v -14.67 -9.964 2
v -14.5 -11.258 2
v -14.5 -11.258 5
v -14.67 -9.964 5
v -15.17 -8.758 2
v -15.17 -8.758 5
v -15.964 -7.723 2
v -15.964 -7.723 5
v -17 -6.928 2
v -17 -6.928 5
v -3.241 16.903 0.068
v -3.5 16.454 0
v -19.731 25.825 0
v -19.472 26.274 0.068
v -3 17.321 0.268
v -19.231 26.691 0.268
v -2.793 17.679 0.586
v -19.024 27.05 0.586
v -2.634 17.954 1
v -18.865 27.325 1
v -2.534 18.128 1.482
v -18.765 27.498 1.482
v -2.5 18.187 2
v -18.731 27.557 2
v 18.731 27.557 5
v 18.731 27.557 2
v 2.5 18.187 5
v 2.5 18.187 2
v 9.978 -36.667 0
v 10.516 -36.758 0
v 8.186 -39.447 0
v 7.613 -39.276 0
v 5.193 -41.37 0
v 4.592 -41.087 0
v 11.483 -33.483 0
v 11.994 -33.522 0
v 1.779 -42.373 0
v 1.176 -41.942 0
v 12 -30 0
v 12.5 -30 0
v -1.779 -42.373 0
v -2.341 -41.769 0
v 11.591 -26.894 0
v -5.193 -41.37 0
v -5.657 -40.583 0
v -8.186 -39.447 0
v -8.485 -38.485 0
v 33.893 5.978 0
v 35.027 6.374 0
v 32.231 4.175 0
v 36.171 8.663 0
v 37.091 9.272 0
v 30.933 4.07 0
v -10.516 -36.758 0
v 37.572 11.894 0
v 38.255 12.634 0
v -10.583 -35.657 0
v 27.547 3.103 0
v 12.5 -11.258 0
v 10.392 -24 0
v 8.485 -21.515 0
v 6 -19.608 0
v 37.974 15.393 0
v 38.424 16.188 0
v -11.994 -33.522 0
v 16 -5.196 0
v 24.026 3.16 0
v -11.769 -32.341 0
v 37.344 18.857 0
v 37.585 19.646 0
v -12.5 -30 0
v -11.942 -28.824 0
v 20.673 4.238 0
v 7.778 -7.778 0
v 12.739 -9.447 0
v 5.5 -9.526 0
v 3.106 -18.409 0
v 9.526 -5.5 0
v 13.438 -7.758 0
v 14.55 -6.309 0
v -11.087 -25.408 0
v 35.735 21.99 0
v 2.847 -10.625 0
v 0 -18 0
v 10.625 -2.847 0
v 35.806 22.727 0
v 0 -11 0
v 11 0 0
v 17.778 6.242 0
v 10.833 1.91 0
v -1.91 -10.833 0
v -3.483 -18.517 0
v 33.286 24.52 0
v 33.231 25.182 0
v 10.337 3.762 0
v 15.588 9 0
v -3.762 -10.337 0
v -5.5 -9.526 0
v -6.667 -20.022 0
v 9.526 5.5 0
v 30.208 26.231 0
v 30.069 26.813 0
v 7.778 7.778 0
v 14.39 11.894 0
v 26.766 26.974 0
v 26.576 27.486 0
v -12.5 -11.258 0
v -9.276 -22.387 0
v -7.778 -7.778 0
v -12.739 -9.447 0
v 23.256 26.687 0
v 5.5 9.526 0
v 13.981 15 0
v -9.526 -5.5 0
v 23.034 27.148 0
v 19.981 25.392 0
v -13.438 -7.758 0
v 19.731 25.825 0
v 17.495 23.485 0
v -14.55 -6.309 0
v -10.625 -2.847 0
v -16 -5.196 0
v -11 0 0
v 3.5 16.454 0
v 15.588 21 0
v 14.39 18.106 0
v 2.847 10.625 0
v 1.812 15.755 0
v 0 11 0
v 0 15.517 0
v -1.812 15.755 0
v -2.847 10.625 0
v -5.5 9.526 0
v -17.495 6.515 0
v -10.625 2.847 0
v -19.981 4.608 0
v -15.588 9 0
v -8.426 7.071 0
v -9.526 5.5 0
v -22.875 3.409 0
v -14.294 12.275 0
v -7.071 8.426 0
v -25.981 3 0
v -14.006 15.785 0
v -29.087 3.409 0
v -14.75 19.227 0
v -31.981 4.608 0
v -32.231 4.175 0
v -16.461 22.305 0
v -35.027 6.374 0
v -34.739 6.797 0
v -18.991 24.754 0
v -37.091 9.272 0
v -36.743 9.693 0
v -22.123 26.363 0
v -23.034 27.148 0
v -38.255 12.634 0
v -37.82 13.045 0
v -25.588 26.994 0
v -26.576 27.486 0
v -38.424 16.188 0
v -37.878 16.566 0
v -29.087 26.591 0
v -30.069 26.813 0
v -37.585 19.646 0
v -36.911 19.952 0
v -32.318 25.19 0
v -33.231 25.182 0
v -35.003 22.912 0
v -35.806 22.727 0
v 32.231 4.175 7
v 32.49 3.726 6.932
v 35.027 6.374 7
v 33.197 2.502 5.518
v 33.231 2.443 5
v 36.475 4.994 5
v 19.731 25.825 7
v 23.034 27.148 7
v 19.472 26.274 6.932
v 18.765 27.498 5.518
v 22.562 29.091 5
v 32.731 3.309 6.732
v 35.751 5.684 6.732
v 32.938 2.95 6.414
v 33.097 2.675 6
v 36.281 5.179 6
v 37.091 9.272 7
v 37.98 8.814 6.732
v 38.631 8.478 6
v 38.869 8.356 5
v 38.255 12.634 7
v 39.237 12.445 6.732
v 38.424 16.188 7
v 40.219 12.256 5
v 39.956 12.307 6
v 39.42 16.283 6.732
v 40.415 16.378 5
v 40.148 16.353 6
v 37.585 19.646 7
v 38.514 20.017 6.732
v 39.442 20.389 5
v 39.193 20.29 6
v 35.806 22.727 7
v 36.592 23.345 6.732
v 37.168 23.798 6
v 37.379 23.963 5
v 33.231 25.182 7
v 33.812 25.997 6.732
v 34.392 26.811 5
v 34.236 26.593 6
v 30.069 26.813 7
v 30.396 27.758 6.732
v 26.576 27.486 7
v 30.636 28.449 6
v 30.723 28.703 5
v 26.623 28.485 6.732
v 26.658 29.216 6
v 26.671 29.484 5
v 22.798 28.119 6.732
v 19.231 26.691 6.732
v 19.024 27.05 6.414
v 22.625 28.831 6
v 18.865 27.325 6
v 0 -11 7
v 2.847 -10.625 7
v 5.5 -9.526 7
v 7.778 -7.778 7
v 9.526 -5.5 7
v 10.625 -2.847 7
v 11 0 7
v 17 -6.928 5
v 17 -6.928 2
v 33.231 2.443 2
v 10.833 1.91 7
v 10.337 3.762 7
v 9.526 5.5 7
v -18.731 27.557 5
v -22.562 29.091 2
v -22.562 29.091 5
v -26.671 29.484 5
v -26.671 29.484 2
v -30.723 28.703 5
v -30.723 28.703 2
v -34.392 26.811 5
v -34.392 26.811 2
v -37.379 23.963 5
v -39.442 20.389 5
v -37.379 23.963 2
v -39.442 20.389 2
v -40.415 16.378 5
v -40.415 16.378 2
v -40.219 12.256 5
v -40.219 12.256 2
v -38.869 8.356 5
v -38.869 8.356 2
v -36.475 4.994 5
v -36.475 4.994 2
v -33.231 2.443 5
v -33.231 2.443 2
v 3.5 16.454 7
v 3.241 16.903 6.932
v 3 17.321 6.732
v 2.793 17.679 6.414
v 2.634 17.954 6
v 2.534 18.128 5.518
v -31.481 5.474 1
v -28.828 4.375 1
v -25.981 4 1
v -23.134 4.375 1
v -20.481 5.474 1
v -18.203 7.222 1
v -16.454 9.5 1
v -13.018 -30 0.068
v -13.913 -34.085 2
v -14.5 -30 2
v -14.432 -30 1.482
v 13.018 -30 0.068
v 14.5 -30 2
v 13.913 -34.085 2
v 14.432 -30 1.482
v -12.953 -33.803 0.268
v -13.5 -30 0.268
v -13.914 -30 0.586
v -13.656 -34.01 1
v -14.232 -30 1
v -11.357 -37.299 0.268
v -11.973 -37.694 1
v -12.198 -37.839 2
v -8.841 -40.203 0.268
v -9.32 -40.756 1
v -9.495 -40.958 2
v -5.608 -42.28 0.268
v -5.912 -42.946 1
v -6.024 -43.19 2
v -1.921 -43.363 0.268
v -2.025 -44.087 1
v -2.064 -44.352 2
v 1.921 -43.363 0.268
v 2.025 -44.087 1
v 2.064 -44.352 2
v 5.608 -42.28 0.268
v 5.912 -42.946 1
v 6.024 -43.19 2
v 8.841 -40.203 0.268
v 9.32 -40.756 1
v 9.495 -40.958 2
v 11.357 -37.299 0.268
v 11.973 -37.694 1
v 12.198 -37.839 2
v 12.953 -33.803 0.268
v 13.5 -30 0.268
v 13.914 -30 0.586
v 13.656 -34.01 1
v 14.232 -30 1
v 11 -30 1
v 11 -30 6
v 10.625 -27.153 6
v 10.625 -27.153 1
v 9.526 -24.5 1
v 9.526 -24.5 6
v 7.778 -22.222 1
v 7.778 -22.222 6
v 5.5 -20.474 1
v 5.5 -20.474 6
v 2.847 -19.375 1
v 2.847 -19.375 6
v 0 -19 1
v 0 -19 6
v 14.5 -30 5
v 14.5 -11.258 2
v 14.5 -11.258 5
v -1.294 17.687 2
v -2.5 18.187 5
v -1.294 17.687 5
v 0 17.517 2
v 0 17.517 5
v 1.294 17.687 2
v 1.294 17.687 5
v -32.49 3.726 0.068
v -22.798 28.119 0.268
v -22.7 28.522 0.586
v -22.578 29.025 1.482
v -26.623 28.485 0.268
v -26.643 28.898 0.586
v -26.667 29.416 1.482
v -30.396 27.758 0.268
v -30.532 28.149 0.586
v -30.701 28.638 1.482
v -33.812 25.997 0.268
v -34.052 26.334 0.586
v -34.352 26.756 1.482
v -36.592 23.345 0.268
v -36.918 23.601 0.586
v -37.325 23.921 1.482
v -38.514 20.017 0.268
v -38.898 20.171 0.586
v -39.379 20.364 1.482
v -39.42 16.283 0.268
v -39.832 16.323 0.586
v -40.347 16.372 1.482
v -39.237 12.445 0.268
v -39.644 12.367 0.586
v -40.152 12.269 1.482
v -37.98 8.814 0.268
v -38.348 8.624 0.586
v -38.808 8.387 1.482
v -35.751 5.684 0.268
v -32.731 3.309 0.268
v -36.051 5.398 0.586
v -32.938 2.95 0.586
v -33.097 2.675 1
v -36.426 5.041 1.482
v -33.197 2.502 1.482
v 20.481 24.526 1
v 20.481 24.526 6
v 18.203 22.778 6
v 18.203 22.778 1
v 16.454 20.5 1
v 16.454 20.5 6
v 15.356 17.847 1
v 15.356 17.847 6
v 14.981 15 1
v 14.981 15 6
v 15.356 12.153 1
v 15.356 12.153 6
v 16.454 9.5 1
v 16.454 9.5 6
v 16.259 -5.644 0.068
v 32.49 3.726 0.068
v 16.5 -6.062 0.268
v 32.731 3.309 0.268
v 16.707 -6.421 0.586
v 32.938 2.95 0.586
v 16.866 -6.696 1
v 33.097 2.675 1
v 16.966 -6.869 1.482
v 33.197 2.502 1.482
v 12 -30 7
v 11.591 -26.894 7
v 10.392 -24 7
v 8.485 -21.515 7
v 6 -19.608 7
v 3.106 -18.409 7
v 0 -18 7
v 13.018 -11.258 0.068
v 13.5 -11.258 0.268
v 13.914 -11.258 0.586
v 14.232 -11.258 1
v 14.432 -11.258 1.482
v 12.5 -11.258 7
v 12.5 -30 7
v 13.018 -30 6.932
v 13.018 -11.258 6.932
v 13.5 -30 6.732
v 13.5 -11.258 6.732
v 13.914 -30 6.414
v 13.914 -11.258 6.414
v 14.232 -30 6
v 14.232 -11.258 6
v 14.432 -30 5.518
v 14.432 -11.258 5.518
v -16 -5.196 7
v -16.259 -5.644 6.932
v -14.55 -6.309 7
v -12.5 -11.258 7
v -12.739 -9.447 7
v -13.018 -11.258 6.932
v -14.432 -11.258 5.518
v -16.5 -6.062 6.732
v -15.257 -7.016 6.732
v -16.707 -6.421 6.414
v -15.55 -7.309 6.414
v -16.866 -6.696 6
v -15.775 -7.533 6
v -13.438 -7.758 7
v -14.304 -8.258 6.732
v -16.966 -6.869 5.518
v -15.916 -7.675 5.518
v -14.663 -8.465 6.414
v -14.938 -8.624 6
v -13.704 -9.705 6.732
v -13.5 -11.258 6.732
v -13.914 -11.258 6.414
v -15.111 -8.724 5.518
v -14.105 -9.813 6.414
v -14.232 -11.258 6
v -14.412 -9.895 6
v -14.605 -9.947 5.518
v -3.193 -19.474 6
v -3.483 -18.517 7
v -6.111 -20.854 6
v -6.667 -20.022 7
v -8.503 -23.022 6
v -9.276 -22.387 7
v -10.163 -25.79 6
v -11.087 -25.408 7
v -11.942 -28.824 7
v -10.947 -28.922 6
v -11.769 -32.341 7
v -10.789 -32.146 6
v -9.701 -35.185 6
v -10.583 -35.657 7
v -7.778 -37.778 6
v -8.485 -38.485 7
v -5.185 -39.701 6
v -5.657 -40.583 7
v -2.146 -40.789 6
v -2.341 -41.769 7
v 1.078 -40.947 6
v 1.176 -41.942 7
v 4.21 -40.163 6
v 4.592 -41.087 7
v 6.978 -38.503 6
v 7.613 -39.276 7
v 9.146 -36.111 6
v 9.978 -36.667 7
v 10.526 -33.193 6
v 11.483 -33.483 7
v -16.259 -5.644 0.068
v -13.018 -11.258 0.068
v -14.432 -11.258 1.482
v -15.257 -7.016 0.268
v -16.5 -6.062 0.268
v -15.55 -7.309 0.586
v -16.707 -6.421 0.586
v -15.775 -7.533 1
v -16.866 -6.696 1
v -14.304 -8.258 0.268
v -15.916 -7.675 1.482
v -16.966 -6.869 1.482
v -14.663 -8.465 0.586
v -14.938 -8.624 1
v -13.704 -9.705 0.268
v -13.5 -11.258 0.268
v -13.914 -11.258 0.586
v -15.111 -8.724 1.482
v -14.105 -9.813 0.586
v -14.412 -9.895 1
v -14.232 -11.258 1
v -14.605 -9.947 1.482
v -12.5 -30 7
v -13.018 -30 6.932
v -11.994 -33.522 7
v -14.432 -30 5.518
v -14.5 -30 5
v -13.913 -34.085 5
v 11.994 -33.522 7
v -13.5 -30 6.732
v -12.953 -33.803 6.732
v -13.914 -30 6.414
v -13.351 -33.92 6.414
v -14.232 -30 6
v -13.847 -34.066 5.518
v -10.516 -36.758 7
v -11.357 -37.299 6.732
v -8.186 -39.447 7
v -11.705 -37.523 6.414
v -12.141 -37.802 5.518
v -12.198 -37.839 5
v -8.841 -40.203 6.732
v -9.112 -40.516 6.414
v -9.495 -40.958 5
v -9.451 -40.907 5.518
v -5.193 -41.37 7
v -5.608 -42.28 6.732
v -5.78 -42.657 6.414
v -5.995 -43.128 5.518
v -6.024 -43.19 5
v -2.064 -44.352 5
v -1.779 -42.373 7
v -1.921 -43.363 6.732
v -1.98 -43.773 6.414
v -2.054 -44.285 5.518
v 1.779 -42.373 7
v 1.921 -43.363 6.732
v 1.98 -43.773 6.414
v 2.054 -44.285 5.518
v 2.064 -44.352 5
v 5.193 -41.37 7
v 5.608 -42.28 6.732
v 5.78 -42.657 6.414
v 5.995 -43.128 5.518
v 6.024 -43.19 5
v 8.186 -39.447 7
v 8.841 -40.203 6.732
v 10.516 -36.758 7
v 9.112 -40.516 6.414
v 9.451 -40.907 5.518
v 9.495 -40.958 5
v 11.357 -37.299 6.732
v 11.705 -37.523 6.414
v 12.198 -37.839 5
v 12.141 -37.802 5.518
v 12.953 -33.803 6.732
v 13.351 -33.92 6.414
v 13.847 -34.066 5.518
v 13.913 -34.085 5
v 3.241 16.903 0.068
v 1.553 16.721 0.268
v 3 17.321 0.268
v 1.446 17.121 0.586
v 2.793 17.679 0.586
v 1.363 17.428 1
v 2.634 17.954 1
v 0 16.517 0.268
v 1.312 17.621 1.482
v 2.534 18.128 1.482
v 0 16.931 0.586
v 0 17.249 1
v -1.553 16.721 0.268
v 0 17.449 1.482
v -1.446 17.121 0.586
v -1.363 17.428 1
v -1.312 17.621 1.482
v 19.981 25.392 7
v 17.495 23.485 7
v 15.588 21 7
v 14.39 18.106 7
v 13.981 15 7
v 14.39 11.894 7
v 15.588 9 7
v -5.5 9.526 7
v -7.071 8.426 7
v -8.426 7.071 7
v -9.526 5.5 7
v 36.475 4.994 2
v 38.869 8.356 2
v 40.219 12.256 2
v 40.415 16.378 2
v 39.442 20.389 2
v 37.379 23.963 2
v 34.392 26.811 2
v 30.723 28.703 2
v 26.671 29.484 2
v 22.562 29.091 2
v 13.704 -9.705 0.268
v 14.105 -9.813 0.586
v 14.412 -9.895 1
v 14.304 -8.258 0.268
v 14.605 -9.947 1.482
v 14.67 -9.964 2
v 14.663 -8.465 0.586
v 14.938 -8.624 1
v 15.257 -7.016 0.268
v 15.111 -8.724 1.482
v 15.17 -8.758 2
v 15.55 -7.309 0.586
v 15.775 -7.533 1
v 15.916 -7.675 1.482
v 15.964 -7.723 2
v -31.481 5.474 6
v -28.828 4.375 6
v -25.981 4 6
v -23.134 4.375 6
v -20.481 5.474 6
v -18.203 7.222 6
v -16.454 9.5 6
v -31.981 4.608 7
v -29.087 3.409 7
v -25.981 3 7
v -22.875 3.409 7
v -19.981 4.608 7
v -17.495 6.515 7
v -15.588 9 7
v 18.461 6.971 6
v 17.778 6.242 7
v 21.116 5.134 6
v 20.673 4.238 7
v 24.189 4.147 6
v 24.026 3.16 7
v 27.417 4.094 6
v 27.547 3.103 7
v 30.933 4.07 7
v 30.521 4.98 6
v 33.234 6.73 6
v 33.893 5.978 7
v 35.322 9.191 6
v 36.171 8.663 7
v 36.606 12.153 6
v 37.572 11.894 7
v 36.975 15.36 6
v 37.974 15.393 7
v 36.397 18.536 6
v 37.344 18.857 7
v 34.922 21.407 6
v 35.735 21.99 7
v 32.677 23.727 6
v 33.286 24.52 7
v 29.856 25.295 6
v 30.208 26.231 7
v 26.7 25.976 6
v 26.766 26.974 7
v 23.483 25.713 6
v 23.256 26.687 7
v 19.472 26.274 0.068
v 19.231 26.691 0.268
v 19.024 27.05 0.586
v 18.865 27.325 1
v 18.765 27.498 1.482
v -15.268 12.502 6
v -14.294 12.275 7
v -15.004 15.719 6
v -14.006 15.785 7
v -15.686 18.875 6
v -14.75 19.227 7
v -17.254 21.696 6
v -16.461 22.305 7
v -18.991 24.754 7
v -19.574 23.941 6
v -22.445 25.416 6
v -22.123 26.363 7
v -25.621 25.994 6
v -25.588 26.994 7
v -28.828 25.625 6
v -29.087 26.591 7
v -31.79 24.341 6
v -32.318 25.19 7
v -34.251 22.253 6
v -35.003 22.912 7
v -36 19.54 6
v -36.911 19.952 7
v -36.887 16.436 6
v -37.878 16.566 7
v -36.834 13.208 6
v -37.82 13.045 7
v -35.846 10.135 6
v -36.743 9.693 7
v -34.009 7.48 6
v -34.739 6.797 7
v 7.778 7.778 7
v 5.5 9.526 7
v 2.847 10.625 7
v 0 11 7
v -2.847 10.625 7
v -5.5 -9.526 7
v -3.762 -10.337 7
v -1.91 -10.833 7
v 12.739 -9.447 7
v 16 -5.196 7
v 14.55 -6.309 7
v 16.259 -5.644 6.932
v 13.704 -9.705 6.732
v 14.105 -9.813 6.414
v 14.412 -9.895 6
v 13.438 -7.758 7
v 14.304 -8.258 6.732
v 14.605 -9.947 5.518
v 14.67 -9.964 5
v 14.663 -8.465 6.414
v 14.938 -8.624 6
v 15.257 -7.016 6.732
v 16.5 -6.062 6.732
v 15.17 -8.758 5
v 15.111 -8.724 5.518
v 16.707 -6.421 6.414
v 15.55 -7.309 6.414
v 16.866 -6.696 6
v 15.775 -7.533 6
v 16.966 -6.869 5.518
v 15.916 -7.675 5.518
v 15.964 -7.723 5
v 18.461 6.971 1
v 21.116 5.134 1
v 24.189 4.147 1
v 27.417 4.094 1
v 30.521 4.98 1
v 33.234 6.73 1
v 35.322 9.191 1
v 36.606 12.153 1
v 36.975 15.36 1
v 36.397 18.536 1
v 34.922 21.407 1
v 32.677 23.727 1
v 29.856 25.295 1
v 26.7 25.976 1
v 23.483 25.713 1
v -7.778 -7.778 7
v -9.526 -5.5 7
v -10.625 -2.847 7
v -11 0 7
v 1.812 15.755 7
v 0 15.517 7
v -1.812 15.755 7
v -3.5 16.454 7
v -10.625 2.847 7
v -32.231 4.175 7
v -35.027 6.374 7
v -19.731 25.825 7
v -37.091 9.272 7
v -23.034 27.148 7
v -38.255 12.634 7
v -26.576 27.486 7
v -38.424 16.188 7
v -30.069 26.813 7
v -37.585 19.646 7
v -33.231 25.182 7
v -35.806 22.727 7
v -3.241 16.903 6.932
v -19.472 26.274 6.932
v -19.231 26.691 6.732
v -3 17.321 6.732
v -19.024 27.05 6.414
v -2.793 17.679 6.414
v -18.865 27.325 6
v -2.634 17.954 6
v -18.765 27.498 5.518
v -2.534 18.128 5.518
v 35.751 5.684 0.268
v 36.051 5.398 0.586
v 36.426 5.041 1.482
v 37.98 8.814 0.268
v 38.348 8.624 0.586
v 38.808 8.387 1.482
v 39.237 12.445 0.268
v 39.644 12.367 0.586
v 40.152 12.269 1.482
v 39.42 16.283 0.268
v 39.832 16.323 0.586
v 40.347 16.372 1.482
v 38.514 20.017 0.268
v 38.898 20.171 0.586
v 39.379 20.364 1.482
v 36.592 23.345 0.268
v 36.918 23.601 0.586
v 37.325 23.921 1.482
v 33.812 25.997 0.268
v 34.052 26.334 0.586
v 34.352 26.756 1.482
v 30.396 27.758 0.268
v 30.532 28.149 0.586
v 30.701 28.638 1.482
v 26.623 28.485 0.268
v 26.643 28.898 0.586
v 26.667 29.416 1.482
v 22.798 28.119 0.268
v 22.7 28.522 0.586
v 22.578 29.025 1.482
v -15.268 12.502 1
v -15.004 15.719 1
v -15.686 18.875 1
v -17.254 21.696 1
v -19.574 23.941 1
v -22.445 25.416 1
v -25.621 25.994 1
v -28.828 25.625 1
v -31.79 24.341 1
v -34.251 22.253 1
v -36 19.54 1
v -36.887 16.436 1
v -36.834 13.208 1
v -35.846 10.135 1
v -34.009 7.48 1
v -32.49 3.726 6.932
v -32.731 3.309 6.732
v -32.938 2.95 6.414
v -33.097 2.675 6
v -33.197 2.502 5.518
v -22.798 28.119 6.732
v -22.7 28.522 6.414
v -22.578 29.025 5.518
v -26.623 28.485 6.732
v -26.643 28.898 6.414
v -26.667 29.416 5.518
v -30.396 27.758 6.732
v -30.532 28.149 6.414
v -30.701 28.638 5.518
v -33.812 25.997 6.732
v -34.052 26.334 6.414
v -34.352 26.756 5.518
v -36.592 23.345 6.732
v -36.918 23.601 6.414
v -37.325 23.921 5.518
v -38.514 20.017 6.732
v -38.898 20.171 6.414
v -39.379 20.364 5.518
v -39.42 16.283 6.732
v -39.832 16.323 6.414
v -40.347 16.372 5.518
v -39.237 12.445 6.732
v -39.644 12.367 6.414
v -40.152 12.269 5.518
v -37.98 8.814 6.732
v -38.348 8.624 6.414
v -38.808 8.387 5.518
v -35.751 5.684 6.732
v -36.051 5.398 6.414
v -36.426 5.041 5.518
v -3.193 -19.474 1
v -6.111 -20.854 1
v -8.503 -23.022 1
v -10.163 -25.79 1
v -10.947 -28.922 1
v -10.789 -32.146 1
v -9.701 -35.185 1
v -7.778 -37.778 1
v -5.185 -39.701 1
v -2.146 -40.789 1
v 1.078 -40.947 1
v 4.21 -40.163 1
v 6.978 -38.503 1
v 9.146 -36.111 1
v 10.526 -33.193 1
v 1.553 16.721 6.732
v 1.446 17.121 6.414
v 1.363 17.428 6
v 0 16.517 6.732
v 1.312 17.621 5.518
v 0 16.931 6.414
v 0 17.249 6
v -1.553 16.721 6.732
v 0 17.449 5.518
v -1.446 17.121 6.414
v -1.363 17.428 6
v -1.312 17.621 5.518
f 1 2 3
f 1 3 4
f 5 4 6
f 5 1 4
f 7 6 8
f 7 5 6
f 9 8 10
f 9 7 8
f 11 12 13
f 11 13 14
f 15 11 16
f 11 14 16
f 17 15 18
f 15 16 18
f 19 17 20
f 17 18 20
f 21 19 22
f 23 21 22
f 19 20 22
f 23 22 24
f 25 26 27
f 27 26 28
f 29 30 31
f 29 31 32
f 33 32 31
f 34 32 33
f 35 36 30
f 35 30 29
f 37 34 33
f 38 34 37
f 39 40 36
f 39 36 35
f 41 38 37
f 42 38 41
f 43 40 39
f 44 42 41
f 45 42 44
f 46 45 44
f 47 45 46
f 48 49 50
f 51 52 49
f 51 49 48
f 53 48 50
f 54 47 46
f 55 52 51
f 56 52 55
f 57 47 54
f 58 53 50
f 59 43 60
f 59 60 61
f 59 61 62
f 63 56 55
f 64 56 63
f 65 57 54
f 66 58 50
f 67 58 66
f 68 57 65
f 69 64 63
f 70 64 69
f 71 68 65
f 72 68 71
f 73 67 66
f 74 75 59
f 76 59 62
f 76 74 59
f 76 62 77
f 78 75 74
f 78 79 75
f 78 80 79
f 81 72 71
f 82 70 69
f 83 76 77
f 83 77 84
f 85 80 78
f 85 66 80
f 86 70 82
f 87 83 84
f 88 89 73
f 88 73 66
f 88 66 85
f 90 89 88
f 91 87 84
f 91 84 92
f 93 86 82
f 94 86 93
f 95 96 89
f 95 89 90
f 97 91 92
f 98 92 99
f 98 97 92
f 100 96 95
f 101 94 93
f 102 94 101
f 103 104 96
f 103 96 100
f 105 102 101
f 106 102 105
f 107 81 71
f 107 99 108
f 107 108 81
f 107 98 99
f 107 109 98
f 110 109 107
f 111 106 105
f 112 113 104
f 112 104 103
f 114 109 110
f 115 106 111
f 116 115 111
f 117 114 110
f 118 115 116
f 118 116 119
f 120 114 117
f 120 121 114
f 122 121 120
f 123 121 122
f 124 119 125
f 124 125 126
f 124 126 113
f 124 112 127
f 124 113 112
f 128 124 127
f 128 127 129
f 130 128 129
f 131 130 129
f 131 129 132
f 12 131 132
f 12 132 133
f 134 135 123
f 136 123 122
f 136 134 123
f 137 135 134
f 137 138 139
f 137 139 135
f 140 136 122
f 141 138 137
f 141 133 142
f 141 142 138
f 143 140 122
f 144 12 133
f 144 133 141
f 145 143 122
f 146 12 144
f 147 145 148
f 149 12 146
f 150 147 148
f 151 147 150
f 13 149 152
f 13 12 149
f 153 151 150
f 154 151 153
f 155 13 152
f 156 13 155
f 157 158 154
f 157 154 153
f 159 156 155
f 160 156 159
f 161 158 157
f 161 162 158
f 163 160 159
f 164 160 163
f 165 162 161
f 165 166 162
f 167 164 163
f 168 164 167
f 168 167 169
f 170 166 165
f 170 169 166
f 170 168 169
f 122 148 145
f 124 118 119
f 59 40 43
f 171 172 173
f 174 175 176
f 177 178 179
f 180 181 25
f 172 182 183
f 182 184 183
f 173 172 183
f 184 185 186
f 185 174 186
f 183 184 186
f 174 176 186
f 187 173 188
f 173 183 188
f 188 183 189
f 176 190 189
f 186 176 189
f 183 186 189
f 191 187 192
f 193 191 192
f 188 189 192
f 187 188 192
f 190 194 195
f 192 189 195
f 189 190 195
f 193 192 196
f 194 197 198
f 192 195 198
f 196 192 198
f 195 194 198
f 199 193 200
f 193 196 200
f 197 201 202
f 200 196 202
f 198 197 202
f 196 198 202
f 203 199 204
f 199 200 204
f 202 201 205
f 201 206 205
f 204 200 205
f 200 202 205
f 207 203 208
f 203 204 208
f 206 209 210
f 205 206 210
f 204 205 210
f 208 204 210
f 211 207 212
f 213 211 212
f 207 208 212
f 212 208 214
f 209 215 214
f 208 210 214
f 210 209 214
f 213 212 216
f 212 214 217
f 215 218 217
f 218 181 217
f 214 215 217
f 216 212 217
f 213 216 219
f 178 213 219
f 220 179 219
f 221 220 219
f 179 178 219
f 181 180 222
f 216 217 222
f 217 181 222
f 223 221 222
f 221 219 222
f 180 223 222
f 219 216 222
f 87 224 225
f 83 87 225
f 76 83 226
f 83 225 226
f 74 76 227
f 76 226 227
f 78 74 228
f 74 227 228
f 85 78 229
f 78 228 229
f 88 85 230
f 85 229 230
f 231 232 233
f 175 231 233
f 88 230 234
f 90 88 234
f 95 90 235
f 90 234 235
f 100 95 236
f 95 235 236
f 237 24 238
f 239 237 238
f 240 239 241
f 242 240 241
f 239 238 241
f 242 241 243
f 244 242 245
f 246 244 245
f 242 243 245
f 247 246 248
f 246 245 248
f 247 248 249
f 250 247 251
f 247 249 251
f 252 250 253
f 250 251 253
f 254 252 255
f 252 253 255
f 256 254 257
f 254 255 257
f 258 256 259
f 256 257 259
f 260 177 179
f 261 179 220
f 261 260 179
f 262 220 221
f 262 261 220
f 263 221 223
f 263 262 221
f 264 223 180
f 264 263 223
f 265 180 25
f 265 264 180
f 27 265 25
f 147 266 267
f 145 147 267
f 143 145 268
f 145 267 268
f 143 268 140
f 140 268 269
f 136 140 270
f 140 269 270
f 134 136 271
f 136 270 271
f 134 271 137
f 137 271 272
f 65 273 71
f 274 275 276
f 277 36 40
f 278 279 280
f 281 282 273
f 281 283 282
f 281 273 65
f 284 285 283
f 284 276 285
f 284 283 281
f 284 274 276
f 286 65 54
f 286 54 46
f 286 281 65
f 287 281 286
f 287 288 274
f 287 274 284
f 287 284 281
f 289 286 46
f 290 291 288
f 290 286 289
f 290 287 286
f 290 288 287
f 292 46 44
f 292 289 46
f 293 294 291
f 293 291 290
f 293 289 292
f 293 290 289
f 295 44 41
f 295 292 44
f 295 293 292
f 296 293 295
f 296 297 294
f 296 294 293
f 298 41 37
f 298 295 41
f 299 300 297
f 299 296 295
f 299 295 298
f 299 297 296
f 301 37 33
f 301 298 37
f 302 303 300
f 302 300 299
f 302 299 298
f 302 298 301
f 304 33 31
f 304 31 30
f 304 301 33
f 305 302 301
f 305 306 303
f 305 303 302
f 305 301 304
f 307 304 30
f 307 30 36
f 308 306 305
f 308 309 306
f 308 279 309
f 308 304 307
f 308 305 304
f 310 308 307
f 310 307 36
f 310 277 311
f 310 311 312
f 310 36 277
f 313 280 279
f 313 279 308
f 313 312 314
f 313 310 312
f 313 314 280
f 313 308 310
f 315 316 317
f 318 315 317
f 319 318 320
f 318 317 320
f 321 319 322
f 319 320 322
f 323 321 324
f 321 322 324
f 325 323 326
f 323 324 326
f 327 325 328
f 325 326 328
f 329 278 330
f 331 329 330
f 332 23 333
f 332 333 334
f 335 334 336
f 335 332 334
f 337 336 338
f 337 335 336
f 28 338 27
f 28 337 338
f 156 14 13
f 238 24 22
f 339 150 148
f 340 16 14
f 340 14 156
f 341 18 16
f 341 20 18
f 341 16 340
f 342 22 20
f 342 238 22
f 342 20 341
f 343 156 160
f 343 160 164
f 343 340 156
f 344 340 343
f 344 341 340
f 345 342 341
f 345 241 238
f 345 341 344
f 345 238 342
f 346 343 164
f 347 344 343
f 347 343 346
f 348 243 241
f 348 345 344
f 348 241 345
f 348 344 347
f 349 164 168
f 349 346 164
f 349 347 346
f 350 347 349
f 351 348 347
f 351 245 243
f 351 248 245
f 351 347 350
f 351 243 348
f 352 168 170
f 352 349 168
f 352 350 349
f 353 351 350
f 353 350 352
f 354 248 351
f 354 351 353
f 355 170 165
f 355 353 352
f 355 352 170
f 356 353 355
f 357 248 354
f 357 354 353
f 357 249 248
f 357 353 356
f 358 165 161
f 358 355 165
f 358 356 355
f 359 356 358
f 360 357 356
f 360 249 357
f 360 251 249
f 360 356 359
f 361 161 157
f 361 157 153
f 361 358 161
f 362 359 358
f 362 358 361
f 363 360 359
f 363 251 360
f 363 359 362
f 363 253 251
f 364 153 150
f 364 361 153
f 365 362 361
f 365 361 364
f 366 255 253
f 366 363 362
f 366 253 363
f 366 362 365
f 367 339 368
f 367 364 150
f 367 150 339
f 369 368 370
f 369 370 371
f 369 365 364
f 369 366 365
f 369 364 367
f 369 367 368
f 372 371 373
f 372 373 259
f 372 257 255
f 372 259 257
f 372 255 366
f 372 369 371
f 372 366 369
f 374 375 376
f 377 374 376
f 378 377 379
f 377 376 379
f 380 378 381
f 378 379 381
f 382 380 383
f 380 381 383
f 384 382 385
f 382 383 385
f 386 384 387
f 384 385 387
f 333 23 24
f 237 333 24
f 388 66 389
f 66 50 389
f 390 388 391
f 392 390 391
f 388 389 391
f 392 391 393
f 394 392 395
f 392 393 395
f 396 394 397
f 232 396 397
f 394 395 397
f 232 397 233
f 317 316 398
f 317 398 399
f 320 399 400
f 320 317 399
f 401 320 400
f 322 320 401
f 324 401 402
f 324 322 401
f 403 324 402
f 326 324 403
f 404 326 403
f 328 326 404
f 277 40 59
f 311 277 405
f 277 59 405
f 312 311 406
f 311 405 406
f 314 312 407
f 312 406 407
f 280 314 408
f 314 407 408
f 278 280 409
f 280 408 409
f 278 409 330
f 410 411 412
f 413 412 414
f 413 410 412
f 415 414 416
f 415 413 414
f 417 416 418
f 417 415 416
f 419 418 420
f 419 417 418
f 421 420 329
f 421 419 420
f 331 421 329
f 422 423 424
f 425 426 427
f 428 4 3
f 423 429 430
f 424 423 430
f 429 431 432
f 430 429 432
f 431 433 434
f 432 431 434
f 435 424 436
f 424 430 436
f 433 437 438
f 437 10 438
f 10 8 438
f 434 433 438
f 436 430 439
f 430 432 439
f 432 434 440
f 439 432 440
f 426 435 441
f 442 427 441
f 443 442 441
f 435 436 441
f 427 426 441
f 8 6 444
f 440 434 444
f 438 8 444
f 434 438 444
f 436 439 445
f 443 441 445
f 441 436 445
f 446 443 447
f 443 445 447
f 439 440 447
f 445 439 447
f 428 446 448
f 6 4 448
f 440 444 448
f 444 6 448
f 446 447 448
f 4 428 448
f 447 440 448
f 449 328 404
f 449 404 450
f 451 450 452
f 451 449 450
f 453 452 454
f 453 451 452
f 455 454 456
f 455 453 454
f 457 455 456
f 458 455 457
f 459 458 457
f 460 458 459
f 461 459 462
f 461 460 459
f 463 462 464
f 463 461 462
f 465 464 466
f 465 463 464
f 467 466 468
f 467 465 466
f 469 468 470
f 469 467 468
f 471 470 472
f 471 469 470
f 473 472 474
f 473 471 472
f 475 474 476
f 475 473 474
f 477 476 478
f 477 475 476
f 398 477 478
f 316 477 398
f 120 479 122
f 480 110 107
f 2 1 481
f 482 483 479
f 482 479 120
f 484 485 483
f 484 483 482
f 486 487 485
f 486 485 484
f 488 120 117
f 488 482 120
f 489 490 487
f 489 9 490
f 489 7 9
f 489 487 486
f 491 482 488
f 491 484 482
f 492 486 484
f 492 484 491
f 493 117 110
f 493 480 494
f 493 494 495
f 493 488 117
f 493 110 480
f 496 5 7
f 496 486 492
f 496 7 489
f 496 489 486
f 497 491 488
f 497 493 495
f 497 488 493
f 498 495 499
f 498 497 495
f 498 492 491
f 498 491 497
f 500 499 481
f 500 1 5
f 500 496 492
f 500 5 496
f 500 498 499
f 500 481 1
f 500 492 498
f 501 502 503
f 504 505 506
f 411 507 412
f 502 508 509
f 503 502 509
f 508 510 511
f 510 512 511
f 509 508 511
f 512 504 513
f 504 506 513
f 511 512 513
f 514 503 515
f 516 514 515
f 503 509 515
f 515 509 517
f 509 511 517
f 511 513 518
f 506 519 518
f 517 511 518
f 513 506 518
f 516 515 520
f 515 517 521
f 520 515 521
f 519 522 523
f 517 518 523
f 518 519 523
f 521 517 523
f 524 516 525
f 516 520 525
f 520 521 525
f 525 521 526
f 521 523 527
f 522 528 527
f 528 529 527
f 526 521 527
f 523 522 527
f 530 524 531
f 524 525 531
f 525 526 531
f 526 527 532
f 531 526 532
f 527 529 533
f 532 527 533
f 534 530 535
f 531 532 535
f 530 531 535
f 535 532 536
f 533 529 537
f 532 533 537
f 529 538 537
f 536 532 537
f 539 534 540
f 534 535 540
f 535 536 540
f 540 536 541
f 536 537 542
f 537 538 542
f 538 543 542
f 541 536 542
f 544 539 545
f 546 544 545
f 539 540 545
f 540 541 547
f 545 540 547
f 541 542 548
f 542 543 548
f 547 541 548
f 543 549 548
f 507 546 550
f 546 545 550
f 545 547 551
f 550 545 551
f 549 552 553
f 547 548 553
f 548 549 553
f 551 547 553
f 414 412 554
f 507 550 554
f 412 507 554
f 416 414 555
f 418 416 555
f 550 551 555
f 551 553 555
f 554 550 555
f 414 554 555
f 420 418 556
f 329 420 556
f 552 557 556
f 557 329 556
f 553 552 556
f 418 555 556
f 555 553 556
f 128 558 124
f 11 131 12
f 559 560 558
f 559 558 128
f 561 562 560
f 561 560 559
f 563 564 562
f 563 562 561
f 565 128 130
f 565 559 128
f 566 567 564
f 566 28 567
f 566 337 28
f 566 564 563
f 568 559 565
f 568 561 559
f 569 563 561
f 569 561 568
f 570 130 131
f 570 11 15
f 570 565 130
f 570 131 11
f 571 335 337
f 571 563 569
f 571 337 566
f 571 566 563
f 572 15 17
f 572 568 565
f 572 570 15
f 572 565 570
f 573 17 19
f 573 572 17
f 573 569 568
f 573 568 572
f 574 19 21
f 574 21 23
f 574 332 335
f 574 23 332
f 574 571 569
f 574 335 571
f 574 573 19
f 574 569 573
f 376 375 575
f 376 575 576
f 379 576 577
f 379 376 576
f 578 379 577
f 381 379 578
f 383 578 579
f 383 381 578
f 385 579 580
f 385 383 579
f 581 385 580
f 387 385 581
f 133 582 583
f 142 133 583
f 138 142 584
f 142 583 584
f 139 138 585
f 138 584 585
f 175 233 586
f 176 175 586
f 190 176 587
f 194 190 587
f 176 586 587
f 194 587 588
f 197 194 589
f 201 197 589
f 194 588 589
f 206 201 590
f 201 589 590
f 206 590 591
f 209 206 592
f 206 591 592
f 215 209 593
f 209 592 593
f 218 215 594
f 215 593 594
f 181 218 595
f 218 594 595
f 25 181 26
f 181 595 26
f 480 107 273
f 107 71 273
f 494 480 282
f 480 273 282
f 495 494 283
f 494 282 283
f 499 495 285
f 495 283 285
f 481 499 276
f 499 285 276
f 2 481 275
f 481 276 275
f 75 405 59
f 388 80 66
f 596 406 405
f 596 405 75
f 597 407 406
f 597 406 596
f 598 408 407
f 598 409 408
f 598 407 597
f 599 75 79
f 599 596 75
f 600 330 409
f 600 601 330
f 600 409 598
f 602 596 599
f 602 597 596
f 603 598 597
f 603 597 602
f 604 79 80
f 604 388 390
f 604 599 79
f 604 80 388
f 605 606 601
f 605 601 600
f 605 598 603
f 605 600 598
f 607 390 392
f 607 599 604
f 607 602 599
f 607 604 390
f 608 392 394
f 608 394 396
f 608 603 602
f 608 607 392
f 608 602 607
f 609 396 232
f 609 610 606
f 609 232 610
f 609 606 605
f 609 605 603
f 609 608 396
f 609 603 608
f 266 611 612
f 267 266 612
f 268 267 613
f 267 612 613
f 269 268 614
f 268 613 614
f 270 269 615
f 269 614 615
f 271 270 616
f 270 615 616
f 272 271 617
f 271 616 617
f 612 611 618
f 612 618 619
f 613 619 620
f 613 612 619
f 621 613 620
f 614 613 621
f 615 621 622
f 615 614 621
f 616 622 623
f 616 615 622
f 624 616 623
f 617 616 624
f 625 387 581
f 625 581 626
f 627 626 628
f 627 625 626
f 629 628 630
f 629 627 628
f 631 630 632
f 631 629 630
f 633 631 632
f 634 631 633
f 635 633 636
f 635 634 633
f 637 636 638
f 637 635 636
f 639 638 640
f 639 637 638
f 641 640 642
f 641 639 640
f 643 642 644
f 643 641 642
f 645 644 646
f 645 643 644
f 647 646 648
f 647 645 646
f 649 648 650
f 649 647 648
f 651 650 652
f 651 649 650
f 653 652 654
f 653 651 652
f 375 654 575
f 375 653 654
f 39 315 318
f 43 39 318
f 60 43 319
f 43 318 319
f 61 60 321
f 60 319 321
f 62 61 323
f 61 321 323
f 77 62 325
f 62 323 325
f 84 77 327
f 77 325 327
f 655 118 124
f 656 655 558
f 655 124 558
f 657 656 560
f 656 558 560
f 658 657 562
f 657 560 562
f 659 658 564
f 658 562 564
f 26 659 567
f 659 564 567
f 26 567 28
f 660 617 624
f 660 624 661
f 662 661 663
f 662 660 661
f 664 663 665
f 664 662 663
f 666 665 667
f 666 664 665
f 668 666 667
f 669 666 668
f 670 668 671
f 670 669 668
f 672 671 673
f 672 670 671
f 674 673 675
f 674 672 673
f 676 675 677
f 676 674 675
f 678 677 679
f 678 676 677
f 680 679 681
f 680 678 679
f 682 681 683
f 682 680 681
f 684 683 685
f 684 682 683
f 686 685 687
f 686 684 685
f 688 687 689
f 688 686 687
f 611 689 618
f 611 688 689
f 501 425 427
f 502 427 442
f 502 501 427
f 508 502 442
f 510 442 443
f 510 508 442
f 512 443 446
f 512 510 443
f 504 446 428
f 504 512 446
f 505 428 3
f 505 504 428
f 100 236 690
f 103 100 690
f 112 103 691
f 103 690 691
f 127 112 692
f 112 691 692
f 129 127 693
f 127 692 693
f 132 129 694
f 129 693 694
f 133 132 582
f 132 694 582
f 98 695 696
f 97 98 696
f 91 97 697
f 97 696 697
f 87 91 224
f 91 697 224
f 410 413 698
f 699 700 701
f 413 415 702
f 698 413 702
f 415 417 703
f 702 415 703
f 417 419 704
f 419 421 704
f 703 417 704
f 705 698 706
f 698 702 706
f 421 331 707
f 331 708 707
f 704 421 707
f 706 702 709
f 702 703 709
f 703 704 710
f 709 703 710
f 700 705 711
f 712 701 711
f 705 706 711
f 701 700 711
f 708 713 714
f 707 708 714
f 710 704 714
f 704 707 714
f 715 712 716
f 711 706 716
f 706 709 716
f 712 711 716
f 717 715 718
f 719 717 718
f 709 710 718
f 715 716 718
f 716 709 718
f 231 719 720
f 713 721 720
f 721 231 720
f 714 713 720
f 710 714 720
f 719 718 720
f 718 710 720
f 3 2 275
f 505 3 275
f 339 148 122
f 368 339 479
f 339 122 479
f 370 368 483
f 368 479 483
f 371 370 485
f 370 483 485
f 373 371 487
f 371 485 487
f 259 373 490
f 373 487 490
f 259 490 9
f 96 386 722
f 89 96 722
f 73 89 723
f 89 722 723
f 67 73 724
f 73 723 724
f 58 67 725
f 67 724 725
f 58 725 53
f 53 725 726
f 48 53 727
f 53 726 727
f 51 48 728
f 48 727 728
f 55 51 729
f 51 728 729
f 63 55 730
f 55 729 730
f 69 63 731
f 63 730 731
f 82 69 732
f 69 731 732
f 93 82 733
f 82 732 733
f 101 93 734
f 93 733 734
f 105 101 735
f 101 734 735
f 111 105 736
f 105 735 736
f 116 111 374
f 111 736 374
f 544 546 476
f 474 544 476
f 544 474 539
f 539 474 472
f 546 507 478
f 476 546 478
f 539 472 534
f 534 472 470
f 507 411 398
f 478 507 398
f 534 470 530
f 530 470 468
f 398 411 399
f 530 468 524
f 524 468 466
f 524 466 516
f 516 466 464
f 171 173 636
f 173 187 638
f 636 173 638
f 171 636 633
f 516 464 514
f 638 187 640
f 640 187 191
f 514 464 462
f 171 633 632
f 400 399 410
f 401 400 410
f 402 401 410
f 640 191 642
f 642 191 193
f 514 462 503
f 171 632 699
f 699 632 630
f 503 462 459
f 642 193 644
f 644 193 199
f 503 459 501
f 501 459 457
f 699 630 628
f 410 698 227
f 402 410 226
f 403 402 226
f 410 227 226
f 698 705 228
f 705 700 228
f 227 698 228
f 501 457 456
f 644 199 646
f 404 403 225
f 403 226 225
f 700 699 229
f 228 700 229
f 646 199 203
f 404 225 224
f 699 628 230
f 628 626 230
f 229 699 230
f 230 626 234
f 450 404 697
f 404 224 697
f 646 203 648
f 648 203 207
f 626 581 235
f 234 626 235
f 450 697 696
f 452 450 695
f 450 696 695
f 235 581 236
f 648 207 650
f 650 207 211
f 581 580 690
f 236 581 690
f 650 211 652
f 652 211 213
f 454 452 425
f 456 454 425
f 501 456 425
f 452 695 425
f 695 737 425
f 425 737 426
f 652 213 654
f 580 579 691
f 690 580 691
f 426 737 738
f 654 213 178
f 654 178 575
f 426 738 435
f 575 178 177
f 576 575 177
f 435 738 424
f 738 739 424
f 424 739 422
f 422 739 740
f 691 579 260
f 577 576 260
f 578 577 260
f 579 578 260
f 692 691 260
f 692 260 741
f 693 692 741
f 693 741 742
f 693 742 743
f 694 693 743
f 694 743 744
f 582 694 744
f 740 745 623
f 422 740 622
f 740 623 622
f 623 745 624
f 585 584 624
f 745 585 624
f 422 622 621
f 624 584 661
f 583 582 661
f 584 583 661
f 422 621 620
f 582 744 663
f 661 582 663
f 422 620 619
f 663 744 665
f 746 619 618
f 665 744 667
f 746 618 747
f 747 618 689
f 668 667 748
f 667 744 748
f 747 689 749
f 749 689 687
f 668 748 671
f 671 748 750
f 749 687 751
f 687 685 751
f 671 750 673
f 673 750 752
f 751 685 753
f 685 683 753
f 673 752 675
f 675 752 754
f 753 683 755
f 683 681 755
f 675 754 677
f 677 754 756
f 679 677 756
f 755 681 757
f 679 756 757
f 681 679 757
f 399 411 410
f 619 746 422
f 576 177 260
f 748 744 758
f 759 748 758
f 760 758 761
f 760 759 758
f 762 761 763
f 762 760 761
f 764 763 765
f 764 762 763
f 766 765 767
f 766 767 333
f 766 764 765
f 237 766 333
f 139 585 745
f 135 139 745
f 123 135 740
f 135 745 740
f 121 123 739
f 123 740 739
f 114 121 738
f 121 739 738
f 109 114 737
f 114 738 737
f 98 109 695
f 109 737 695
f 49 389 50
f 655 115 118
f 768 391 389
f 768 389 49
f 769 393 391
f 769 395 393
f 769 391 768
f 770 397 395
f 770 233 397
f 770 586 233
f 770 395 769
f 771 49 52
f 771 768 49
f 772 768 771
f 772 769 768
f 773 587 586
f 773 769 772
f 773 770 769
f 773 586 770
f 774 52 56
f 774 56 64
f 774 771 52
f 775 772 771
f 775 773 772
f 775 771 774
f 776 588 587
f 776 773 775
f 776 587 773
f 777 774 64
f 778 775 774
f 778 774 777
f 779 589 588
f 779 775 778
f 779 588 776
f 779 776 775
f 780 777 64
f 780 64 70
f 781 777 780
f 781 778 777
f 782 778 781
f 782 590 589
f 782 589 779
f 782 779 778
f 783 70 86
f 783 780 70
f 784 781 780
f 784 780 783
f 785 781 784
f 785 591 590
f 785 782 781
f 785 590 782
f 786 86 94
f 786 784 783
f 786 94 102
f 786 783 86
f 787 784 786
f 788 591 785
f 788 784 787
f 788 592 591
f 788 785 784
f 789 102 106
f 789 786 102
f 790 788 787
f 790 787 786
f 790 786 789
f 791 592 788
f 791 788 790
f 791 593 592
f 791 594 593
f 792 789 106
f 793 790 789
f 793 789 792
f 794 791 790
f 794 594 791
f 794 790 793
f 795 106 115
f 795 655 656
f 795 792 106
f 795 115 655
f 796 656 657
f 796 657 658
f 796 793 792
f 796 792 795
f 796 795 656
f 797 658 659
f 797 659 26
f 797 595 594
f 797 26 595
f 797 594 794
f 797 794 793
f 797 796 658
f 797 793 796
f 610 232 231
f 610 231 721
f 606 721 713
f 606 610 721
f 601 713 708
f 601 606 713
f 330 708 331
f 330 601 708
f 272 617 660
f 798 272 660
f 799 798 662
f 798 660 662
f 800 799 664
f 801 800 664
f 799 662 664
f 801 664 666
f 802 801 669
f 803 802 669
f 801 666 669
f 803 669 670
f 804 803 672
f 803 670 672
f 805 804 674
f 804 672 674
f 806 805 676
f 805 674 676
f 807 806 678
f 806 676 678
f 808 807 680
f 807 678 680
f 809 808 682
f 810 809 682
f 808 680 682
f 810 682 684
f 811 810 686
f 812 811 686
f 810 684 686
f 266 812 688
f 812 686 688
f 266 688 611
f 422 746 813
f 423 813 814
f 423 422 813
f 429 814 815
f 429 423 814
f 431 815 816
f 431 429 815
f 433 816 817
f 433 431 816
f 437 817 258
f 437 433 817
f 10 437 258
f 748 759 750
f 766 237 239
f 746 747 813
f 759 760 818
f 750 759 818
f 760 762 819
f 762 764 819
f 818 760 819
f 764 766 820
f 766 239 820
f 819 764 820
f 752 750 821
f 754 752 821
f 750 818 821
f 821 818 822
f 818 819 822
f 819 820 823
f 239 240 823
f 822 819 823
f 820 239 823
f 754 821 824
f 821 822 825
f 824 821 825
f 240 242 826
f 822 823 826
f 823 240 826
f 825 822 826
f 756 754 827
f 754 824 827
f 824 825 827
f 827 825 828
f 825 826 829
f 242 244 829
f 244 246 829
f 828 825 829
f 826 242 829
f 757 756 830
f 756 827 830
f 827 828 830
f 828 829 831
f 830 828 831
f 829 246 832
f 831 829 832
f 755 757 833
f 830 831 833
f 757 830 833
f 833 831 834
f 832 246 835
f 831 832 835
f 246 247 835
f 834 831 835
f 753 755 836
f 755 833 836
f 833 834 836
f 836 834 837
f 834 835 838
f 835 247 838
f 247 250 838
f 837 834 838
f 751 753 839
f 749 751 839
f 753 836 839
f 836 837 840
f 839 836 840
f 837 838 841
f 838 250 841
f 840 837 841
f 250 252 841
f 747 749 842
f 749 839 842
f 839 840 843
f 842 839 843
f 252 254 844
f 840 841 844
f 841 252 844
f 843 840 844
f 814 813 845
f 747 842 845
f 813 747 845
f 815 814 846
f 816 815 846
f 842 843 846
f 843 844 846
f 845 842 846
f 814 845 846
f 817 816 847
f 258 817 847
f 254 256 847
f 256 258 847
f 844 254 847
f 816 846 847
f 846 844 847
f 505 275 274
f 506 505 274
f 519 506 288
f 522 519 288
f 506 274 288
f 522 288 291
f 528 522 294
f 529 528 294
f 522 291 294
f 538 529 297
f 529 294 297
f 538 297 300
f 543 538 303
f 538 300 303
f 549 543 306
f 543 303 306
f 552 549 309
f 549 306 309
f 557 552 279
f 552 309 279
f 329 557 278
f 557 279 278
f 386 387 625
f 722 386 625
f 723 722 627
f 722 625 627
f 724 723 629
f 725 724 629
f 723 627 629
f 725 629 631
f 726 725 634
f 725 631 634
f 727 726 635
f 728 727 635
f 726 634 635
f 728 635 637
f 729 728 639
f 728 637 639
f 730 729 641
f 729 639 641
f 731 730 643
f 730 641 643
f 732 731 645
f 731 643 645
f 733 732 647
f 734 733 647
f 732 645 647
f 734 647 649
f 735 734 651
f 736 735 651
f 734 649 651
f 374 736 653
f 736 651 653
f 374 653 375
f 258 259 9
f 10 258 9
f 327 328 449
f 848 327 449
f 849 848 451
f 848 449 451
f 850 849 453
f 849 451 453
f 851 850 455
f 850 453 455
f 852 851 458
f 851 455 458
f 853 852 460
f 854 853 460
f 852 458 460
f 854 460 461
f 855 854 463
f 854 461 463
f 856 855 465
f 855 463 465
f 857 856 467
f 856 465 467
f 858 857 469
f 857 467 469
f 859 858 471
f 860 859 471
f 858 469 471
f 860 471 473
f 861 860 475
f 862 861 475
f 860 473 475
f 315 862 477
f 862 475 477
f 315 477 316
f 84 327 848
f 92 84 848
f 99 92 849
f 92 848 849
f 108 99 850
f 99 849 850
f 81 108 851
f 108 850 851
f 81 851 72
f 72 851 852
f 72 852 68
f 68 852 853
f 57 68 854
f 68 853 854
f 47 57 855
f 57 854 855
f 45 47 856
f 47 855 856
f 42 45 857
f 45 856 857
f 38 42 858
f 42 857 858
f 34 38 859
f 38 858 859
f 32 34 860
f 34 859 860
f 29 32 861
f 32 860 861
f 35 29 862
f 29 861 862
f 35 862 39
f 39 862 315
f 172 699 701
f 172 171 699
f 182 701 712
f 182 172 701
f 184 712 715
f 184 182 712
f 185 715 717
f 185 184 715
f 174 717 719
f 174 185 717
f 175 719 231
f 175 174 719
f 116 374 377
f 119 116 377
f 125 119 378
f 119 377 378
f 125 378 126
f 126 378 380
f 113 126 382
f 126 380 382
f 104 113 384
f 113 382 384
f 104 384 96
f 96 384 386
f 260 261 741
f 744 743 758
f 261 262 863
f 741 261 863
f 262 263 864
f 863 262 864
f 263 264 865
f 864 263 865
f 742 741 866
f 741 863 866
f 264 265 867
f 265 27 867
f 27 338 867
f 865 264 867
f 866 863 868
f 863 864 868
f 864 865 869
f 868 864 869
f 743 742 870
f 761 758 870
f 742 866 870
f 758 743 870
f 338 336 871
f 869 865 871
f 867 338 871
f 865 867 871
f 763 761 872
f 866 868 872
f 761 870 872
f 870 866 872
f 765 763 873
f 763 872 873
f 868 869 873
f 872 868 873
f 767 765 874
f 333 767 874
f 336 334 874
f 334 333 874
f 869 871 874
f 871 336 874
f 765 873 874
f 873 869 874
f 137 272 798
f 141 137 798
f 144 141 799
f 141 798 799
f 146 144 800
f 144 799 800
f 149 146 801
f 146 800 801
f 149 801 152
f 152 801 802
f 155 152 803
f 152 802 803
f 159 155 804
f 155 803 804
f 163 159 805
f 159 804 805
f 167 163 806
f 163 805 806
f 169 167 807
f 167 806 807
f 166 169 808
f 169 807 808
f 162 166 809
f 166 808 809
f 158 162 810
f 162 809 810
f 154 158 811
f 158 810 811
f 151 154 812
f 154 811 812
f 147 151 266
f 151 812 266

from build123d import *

# Parameters (mm, degrees)
F1_DEPTH    = 7
F3_DEPTH    = 7.001
F5_COUNT    = 3
F7_T1_DEPTH = 7
F8_R        = 2
F9_SIZE     = 1


# Not quite as in the source:
# - a fillet or chamfer that OpenCascade refuses, or shapes differently, is made with other operations: its cross-section is extruded or revolved along the edge and cut away or added
# - a feature names something its author has since deleted; it is built from what else it names


with BuildPart() as f1:
    # F0 (on Top) → F1 (new body)
    with BuildSketch(Plane.XY):
        with BuildLine():
            ThreePointArc((-14.5, 0), (0, -14.5), (14.5, 0))
            ThreePointArc((14.5, 0), (0, 14.5), (-14.5, 0))
        make_face()
        with BuildLine():
            Line((14.5, -30), (14.5, 0))
            ThreePointArc((14.5, 0), (0, -14.5), (-14.5, 0))
            Line((-14.5, 0), (-14.5, -30))
            ThreePointArc((-14.5, -30), (0, -15.5), (14.5, -30))
        make_face()
        with BuildLine():
            ThreePointArc((-14.5, -30), (0, -44.5), (14.5, -30))
            ThreePointArc((14.5, -30), (0, -15.5), (-14.5, -30))
        make_face()
    extrude(amount=F1_DEPTH)

    # F2 (on face) → F3 (cut, through all)
    with BuildSketch(Plane.XY.offset(7)):
        with BuildLine():
            ThreePointArc((0, -11), (7.7781745931, -7.7781745931), (11, 0))
            ThreePointArc((11, 0), (-7.7781745931, 7.7781745931), (0, -11))
        make_face()
        with BuildLine():
            ThreePointArc((11, -30), (7.7781745931, -22.2218254069), (0, -19))
            ThreePointArc((0, -19), (-7.7781745931, -37.7781745931), (11, -30))
        make_face()
    extrude(amount=-F3_DEPTH, mode=Mode.SUBTRACT)


with BuildPart() as f5_1:
    # F5: instance of F1
    add(f1.part.rotate(Axis((0, 0, 13.2415927947), (0, 0, 1)), 1 * 360 / F5_COUNT))


with BuildPart() as f5_2:
    # F5: instance of F1
    add(f1.part.rotate(Axis((0, 0, 13.2415927947), (0, 0, 1)), 2 * 360 / F5_COUNT))


with BuildPart() as f1_1:
    add(f1.part)

    # F6: union F5_2, F5_1
    add(f5_2.part)
    add(f5_1.part)

    # F7: fillet of radius 5 on 6 edges, made by hand

    # F7_s2 → F7_t1 (join)
    with BuildSketch(Plane.XY):
        with BuildLine():
            ThreePointArc((17, -6.9282032303), (15.1698729811, -8.7583302492), (14.5, -11.2583302492))
            Line((14.5, -11.2583302492), (14.5, -8.3715789032))
            Line((14.5, -8.3715789032), (17, -6.9282032303))
        make_face()
        with BuildLine():
            ThreePointArc((-2.5, 18.1865334795), (0, 17.5166604984), (2.5, 18.1865334795))
            Line((2.5, 18.1865334795), (0, 16.7431578065))
            Line((0, 16.7431578065), (-2.5, 18.1865334795))
        make_face()
        with BuildLine():
            ThreePointArc((-14.5, -11.2583302492), (-15.1698729811, -8.7583302492), (-17, -6.9282032303))
            Line((-17, -6.9282032303), (-14.5, -8.3715789032))
            Line((-14.5, -8.3715789032), (-14.5, -11.2583302492))
        make_face()
    extrude(amount=F7_T1_DEPTH)

    # F8
    f8_edges = [f1_1.edges().sort_by_distance(p)[0] for p in [
        (38.53813, 22.25, 7),
        (0, -44.5, 0),
        (-25.115381, -2.242786, 0),
        (-15.169873, -8.75833, 0),
        (-14.5, -20.629165, 0),
        (14.5, -20.629165, 0),
        (15.169873, -8.75833, 0),
        (25.115381, -2.242786, 0),
        (38.53813, 22.25, 0),
        (10.615381, 22.871951, 0),
        (0, 17.51666, 0),
        (-10.615381, 22.871951, 0),
        (-38.53813, 22.25, 0),
        (-25.115381, -2.242786, 7),
        (-14.5, -20.629165, 7),
        (0, -44.5, 7),
        (14.5, -20.629165, 7),
        (25.115381, -2.242786, 7),
        (10.615381, 22.871951, 7),
        (-10.615381, 22.871951, 7),
        (-38.53813, 22.25, 7),
        (-15.169873, -8.75833, 7),
        (15.169873, -8.75833, 7),
        (0, 17.51666, 7),
    ]]
    fillet(f8_edges, radius=F8_R)

    # F9
    f9_edges = [f1_1.edges().sort_by_distance(p)[0] for p in [
        (-35.507042, 20.5, 7),
        (0, -41, 7),
        (35.507042, 20.5, 7),
        (0, -41, 0),
        (35.507042, 20.5, 0),
        (-35.507042, 20.5, 0),
    ]]
    chamfer(f9_edges, length=F9_SIZE)


solid = f1_1.part
